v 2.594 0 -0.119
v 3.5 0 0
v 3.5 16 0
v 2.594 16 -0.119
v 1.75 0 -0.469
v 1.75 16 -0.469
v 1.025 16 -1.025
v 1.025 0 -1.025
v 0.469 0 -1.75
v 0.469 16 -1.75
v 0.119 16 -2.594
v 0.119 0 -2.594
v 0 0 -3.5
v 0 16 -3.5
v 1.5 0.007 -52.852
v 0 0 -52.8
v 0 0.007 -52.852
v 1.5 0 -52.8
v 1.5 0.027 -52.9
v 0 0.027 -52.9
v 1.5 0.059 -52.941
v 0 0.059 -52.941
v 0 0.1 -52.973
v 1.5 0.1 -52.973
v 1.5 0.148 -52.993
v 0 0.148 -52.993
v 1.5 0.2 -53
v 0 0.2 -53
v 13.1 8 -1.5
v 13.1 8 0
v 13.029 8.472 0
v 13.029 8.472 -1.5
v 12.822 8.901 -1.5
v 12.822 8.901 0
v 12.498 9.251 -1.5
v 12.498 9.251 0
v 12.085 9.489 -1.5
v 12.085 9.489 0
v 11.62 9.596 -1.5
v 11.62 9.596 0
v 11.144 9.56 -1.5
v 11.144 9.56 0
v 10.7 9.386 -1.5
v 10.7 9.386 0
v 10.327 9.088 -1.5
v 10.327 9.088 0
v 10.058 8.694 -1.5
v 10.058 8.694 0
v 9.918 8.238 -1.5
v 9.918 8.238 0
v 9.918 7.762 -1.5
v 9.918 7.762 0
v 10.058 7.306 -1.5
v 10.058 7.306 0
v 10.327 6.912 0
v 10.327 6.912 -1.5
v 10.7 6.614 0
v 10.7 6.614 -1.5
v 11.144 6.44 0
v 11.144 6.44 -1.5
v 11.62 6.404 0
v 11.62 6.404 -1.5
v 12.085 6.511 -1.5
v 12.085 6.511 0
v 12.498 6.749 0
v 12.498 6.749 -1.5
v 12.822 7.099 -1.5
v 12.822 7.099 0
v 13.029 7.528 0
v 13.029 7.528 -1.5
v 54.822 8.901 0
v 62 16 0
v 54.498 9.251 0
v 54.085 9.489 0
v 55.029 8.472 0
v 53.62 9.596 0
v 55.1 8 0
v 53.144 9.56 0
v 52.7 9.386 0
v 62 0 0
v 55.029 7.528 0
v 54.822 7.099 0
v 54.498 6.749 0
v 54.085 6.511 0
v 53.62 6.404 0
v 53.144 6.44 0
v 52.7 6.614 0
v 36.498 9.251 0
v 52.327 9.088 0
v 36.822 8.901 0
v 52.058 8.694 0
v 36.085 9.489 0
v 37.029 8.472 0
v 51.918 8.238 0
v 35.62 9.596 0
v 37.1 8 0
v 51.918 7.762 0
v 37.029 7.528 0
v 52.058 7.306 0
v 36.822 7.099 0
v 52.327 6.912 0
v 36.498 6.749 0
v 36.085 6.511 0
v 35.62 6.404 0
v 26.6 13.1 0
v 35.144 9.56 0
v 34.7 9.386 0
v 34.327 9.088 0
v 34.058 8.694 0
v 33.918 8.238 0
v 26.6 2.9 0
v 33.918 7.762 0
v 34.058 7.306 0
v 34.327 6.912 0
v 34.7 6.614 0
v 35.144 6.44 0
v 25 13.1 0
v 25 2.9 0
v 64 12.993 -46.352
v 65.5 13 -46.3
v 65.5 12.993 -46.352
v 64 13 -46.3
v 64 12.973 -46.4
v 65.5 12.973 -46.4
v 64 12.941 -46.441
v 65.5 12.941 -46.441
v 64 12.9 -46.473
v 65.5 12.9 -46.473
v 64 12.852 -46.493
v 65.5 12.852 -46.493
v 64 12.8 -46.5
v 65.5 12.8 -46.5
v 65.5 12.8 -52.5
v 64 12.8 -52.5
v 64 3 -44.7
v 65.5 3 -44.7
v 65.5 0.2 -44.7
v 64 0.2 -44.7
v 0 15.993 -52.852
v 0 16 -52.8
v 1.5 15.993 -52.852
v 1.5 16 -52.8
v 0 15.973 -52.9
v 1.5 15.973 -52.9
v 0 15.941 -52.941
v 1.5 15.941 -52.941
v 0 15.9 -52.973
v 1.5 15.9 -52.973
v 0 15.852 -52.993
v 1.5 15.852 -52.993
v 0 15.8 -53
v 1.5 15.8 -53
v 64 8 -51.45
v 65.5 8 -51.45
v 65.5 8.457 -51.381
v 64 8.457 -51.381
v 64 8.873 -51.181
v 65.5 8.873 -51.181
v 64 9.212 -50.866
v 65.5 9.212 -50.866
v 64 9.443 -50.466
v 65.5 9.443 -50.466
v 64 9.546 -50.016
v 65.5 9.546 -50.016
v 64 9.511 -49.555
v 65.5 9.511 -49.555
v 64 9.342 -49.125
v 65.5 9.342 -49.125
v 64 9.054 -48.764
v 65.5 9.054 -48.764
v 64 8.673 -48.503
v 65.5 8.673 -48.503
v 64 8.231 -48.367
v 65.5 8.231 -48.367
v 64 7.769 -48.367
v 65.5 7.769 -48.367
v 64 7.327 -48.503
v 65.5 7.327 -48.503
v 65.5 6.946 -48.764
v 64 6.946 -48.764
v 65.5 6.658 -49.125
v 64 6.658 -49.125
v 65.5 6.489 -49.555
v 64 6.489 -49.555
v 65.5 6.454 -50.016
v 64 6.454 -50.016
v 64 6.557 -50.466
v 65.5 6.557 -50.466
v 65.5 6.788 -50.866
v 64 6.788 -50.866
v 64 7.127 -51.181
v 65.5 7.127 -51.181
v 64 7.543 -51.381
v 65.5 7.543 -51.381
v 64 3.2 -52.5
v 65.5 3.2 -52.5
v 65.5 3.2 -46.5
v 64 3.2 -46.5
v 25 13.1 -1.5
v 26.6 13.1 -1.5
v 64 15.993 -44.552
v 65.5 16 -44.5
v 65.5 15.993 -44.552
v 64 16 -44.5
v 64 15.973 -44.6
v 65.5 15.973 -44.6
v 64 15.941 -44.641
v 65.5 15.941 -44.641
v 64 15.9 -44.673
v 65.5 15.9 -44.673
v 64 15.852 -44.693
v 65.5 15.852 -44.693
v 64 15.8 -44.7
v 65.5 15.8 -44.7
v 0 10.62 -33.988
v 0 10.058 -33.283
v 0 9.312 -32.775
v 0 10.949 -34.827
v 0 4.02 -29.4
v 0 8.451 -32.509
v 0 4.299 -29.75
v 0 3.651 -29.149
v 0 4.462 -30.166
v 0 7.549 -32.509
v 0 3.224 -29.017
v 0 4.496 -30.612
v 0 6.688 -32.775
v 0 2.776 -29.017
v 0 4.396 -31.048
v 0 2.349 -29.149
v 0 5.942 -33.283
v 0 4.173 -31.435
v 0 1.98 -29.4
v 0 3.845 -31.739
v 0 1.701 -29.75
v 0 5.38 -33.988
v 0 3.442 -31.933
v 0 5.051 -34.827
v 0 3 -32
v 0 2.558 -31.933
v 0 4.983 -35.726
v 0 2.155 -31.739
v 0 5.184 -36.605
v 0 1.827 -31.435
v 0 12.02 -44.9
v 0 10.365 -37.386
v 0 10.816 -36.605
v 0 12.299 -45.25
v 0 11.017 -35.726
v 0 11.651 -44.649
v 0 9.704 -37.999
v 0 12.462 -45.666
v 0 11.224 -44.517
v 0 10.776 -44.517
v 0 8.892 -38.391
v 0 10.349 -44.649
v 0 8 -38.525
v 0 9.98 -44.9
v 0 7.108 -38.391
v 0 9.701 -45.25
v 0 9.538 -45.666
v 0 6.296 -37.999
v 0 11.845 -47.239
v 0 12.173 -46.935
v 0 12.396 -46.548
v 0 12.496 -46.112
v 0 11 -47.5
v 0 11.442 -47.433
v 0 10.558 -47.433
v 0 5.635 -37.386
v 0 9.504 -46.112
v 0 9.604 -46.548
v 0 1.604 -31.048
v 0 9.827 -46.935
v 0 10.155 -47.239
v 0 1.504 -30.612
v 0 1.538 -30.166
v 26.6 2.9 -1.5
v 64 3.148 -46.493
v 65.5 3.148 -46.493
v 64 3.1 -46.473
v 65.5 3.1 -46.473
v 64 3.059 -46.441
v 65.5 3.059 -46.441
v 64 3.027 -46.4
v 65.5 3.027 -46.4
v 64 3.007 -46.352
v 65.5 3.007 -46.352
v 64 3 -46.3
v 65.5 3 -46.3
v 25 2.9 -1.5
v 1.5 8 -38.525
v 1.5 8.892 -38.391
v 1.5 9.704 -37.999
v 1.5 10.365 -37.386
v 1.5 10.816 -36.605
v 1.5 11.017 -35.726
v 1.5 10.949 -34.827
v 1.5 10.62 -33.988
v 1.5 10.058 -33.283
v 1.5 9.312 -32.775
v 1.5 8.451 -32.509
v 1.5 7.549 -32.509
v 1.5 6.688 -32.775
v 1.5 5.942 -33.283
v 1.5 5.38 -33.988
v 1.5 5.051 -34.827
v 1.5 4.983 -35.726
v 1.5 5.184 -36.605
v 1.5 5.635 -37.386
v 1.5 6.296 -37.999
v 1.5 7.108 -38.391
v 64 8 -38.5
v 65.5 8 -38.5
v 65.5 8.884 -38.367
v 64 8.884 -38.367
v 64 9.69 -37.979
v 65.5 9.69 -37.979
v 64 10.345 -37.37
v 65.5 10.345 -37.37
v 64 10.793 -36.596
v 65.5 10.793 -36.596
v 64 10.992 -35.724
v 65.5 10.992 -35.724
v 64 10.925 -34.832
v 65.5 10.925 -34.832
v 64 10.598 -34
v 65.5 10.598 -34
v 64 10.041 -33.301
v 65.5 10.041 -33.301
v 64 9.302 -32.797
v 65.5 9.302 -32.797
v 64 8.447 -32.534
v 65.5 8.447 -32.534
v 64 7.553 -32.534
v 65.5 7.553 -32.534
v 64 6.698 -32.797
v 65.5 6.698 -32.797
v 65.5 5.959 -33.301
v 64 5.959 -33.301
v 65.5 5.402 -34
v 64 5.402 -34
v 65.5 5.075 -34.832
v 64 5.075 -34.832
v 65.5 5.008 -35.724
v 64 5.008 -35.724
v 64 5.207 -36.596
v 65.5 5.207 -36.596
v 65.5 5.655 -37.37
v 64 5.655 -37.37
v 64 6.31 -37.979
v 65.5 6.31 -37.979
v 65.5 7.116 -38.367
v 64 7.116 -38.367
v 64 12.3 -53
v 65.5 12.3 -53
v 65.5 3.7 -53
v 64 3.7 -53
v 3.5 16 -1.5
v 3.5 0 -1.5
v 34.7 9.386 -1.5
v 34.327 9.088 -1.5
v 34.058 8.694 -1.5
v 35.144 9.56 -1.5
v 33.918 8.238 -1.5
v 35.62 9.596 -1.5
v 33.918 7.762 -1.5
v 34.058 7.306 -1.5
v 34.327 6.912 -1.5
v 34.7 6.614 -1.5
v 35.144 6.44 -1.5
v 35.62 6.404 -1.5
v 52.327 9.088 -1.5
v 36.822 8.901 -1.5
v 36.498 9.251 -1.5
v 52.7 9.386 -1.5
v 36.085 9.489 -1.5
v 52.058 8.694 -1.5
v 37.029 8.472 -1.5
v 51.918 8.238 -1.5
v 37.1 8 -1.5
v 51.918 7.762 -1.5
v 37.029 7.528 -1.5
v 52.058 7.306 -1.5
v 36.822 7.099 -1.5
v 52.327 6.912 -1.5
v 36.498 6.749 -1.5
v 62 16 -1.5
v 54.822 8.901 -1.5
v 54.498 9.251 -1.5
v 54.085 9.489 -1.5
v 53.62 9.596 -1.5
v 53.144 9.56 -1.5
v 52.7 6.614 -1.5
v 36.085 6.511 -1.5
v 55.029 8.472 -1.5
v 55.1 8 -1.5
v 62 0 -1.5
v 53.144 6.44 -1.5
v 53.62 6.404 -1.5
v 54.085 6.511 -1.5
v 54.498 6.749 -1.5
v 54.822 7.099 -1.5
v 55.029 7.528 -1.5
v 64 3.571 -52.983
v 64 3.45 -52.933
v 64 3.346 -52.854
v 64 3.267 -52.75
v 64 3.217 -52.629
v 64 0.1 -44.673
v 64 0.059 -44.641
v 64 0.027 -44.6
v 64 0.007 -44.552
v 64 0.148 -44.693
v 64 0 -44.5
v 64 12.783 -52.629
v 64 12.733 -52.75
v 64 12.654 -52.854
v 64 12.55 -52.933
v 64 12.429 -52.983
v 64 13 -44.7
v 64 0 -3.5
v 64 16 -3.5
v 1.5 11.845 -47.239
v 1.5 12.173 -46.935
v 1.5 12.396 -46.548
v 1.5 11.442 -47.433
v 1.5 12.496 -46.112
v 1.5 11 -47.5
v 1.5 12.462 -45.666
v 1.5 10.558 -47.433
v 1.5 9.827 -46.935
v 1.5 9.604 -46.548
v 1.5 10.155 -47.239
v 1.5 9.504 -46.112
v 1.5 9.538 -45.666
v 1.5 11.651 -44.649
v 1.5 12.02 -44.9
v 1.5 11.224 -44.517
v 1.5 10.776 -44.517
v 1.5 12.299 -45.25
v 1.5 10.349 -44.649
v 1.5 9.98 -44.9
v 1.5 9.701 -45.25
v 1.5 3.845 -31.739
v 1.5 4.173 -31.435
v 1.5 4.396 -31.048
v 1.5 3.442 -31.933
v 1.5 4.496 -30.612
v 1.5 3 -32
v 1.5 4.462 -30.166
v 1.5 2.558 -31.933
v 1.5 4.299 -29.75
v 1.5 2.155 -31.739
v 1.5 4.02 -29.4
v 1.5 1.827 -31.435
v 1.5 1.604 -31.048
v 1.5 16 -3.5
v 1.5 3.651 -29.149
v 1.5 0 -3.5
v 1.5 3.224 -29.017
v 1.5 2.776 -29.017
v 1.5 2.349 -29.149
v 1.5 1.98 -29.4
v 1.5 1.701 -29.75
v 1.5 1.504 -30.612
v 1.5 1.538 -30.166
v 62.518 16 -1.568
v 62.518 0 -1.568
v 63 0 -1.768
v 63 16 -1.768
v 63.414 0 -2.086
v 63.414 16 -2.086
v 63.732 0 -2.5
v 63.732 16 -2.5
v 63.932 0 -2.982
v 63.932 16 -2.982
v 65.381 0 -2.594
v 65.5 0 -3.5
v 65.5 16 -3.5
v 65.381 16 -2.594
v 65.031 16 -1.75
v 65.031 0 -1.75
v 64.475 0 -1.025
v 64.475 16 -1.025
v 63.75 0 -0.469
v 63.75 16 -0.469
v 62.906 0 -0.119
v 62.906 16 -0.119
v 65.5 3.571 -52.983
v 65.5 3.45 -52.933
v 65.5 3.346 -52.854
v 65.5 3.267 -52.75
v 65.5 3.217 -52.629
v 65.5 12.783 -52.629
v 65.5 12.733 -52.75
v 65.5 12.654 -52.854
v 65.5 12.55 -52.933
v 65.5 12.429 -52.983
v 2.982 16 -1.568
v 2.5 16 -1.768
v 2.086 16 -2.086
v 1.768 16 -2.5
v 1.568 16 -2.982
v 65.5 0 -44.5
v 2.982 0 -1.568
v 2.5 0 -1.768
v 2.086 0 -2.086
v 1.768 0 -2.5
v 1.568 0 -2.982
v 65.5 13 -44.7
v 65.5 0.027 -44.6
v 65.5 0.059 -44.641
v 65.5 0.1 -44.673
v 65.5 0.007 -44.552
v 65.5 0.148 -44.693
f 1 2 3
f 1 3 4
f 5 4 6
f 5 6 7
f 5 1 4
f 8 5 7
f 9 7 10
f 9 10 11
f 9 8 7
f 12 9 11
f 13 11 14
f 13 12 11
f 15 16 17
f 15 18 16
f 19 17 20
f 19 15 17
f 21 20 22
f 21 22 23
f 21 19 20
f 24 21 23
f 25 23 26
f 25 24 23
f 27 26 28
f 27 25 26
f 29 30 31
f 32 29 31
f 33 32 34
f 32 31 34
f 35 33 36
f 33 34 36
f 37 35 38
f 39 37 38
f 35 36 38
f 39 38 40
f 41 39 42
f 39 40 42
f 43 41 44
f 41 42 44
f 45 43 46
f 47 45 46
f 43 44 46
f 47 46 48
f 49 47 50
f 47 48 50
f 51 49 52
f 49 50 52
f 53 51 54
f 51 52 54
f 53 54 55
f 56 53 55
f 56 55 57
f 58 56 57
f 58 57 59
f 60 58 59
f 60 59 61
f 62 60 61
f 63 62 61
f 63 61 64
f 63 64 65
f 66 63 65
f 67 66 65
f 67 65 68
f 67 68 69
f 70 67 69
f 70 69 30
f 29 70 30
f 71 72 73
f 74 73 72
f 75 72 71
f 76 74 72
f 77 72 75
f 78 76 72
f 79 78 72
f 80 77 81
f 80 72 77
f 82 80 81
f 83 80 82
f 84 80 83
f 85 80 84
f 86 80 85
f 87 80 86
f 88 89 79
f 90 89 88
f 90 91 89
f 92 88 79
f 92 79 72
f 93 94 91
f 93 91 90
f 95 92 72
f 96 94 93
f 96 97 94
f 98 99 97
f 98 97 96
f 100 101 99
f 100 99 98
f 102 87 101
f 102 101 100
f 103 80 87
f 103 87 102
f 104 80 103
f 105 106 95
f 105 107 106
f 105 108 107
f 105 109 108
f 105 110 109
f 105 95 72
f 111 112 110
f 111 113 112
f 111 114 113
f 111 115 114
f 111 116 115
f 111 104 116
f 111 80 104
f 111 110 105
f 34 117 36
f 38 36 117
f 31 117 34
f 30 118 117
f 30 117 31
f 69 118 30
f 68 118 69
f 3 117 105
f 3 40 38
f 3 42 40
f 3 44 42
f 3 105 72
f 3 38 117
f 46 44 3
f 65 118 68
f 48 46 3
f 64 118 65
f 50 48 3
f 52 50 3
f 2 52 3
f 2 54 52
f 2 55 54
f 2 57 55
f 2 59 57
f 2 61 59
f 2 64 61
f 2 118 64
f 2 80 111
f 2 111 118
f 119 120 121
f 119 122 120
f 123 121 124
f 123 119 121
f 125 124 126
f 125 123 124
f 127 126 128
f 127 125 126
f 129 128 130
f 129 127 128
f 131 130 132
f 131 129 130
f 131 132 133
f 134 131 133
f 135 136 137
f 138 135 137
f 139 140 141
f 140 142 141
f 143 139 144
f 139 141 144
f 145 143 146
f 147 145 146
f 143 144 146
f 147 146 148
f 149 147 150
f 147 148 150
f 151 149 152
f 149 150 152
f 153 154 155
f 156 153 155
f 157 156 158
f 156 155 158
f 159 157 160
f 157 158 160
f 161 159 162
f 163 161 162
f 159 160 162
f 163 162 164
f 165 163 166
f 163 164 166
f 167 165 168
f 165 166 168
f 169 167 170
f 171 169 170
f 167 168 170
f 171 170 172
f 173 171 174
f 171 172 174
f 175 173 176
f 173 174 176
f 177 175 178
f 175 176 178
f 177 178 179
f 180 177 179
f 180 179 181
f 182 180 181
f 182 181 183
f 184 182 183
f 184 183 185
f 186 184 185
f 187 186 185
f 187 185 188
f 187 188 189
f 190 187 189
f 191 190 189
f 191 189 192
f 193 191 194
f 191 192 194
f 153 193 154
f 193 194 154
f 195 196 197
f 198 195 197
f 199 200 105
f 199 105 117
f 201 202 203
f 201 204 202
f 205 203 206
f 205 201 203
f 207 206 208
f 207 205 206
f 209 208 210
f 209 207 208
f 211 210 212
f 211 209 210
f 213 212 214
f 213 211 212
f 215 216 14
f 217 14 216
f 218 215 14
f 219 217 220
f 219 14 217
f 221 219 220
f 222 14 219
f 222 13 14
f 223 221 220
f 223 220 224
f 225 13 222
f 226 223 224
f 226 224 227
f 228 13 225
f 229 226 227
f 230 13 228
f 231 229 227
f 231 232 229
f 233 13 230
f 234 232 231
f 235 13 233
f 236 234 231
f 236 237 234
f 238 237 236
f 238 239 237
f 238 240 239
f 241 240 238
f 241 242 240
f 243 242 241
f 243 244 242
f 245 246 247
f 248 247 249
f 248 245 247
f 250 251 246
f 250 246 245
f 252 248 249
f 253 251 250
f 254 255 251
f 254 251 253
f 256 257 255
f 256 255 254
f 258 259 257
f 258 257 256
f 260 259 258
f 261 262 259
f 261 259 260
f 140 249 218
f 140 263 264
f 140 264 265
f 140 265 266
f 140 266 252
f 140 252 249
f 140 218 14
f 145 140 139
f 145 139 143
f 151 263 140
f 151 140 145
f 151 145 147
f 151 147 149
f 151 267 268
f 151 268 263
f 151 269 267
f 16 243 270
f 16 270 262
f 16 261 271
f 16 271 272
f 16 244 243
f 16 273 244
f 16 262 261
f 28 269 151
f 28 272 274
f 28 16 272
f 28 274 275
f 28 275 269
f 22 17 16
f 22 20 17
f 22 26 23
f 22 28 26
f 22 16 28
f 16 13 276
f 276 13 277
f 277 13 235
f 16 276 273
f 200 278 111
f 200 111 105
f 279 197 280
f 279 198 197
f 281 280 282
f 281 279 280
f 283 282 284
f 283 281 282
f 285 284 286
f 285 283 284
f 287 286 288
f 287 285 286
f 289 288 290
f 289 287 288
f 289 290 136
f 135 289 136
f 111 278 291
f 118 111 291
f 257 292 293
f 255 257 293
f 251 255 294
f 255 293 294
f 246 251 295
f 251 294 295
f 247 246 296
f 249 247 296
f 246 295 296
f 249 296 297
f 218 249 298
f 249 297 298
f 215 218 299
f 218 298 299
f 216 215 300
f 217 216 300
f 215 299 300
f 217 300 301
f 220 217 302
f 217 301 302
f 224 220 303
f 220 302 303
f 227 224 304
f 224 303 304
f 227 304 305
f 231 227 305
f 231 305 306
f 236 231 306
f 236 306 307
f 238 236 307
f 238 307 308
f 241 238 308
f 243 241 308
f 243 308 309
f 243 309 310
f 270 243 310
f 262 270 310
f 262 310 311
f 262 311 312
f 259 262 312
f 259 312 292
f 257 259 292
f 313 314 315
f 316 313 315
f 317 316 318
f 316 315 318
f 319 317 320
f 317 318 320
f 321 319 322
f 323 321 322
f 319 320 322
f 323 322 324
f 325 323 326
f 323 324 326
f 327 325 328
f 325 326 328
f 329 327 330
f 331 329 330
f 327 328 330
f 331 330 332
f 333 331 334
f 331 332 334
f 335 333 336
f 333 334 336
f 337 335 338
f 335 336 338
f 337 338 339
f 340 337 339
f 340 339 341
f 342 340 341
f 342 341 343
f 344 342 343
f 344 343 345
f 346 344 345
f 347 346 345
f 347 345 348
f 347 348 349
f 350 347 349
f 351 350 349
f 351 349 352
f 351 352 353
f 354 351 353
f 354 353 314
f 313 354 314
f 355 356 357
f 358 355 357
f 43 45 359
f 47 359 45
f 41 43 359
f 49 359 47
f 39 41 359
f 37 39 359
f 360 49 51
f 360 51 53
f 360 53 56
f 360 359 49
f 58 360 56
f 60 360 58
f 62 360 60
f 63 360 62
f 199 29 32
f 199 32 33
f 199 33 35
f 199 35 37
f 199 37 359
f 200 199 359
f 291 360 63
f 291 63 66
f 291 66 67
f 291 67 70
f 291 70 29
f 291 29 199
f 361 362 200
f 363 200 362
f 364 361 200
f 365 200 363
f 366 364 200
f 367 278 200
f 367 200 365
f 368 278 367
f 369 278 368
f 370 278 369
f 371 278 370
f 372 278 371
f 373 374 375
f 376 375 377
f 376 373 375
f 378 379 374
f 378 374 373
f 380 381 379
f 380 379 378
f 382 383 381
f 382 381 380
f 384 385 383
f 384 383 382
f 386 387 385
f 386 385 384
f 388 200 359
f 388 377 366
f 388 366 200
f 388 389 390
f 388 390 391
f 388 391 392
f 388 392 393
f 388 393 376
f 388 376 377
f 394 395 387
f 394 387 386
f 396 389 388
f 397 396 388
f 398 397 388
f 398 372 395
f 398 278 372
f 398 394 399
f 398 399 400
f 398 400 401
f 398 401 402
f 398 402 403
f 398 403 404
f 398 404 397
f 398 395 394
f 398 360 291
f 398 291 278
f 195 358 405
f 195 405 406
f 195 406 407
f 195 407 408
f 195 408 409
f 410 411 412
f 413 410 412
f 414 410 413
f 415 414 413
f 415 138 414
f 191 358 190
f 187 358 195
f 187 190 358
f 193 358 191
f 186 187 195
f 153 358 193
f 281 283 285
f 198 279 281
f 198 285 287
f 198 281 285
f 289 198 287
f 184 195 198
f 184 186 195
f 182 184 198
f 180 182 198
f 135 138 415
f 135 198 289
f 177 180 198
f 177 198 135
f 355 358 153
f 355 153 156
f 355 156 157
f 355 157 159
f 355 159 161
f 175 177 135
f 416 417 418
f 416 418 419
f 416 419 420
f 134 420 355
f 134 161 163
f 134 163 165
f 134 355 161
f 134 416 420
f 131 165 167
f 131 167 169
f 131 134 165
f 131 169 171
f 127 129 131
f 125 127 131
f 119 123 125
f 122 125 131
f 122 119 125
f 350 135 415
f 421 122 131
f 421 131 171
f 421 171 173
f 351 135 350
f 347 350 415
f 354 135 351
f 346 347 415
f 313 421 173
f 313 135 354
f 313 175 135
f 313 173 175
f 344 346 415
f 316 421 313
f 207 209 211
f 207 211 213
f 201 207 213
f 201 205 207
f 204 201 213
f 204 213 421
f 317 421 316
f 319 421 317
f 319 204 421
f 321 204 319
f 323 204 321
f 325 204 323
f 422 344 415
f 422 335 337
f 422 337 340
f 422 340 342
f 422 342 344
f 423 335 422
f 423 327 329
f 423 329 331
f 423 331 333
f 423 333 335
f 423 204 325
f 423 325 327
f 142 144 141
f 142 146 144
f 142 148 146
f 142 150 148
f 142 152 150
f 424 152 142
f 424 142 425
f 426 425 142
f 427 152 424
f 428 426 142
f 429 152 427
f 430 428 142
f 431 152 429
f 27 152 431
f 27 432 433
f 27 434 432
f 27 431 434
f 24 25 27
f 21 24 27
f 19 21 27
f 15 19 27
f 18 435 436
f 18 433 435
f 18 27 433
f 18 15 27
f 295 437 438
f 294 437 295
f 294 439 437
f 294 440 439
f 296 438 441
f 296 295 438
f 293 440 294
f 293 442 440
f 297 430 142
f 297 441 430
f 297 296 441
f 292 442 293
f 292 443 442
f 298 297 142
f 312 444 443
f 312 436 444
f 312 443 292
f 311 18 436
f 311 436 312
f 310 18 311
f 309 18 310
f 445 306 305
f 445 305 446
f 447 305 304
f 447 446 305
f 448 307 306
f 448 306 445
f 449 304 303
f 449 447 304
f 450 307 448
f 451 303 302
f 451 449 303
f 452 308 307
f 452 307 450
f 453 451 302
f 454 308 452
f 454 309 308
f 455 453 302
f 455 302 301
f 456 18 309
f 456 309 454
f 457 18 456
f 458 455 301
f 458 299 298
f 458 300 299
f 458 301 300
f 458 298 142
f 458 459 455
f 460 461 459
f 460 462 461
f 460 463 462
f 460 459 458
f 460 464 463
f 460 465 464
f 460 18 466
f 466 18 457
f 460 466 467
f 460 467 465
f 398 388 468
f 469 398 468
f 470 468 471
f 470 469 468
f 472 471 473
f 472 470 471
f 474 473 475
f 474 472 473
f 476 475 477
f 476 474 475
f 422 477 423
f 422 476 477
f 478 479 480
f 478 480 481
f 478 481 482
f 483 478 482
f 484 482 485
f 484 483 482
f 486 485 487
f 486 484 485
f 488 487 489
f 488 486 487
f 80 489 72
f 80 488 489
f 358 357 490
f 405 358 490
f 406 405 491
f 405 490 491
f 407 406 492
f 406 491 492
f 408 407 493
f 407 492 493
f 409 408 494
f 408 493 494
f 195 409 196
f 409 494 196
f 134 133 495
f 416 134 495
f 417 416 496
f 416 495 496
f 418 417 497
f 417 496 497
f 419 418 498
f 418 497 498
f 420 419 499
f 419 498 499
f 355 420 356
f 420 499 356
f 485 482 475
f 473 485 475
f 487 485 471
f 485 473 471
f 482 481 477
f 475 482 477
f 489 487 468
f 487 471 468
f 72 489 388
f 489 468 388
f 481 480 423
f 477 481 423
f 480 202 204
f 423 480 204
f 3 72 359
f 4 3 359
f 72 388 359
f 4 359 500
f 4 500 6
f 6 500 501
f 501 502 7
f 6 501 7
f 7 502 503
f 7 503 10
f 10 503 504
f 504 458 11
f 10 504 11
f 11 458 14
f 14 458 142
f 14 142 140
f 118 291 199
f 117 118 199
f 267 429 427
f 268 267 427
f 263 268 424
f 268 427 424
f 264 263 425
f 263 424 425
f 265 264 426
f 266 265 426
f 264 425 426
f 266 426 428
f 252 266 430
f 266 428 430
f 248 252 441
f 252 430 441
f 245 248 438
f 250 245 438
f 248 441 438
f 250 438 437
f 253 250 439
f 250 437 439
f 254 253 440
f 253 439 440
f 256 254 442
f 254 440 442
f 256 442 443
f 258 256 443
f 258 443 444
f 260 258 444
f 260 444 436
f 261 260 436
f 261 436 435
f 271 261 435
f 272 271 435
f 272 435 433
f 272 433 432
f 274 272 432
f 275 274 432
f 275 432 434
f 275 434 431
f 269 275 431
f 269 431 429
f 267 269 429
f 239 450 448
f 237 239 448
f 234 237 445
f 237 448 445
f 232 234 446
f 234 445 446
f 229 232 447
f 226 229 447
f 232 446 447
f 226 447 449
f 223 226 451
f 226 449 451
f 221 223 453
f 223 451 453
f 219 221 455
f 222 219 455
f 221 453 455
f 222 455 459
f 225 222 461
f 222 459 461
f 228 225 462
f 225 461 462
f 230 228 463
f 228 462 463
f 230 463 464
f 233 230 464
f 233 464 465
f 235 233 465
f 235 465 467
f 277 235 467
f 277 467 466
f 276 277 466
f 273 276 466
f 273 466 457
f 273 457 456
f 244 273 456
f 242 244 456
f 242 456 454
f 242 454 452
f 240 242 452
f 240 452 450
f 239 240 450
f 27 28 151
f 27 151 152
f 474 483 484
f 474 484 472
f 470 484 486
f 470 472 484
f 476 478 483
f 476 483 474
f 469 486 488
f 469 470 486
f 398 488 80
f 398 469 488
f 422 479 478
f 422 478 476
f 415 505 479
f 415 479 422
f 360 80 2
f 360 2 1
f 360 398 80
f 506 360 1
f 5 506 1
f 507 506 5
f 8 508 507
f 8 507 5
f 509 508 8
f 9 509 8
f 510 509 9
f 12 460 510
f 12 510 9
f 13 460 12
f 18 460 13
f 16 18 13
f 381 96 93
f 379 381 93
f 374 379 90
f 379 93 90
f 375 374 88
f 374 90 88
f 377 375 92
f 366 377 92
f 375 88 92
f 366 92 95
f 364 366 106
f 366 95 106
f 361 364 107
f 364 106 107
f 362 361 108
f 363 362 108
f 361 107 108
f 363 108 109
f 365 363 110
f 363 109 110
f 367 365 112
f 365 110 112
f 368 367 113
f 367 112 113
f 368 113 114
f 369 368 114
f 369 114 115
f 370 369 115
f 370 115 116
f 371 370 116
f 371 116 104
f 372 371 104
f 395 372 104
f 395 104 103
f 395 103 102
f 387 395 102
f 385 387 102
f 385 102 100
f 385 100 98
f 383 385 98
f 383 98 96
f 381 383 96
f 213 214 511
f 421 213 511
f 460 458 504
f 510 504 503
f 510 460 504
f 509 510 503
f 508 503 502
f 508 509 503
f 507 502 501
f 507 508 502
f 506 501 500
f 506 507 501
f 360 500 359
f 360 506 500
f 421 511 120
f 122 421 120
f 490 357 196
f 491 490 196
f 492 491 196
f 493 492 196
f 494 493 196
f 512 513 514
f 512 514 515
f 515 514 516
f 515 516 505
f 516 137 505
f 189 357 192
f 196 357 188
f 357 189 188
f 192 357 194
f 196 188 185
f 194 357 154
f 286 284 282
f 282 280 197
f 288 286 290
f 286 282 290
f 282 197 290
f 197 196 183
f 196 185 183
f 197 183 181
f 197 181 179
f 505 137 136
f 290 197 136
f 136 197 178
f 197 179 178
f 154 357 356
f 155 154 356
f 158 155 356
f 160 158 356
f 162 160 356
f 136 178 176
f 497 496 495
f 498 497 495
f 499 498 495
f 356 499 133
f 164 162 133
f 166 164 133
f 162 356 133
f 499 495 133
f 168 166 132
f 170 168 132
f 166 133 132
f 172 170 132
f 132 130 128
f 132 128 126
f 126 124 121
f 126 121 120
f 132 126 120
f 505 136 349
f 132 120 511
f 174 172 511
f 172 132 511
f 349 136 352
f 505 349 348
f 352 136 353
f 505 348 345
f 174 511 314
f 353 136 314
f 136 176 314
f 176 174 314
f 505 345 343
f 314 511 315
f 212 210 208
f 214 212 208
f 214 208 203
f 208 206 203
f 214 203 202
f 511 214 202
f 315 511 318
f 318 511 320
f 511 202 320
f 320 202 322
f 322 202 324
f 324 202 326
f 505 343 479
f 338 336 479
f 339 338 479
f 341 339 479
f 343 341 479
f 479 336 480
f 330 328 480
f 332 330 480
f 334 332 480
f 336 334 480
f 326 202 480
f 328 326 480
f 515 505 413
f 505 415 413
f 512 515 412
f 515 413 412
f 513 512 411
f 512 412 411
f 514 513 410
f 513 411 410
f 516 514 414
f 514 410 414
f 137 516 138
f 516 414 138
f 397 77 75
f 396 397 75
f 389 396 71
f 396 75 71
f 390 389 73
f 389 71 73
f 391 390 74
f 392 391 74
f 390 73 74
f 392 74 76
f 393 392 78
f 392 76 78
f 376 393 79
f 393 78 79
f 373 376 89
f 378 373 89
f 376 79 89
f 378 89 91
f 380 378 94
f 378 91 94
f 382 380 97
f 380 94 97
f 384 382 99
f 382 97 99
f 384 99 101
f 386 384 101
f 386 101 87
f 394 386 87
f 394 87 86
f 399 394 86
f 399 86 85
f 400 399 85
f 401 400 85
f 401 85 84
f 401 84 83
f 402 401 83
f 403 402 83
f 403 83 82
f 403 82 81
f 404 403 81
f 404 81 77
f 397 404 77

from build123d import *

# Parameters (mm, degrees)
BASE_FLANGE1_DEPTH = 16
SKETCH6_W          = 1.6
SKETCH6_H          = 10.2
CUT_EXTRUDE1_DEPTH = 10
SKETCH7_R          = 3
CUT_EXTRUDE2_DEPTH = 10
CUT_EXTRUDE3_DEPTH = 10
FILLET1_R          = 0.2
SKETCH11_R         = 1.55
TAB1_DEPTH         = 1.5
SKETCH15_R         = 1.6
CUT_EXTRUDE6_DEPTH = 10
SKETCH9_R          = 3.025
SKETCH9_R_2        = 1.5
CUT_EXTRUDE4_DEPTH = 10


# Sheet-metal steps are written as plain solids
with BuildPart() as part:
    # Sketch1 → Base-Flange1 (new body)
    with BuildSketch(Plane(origin=(0, 0, 0), x_dir=(1, 0, 0), z_dir=(0, 1, 0))):
        with BuildLine():
            Line((65.5, 50), (65.5, 3.5))
            ThreePointArc((65.5, 3.5), (64.474873734, 1.025126266), (62, 0))
            Line((62, 0), (3.5, 0))
            ThreePointArc((3.5, 0), (1.025126266, 1.025126266), (0, 3.5))
            Line((0, 3.5), (0, 53))
            Line((0, 53), (1.5, 53))
            Line((1.5, 53), (1.5, 3.5))
            ThreePointArc((1.5, 3.5), (2.085786438, 2.085786438), (3.5, 1.5))
            Line((3.5, 1.5), (62, 1.5))
            ThreePointArc((62, 1.5), (63.414213562, 2.085786438), (64, 3.5))
            Line((64, 3.5), (64, 50))
            Line((64, 50), (65.5, 50))
        make_face()
    extrude(amount=BASE_FLANGE1_DEPTH)

    # Sketch6 → Cut-Extrude1 (cut)
    with BuildSketch(Plane(origin=(0, 0, -1.5), x_dir=(-1, 0, 0), z_dir=(0, 0, -1))):
        with Locations((-25.8, 8)):
            Rectangle(SKETCH6_W, SKETCH6_H)
    extrude(amount=-CUT_EXTRUDE1_DEPTH, mode=Mode.SUBTRACT)

    # Sketch7 → Cut-Extrude2 (cut)
    with BuildSketch(Plane(origin=(65.5, 0, 0), x_dir=(0, 0, -1), z_dir=(1, 0, 0))):
        with Locations((35.5, 8)):
            Circle(SKETCH7_R)
    extrude(amount=-CUT_EXTRUDE2_DEPTH, mode=Mode.SUBTRACT)

    # Sketch8 → Cut-Extrude3 (cut)
    with BuildSketch(Plane(origin=(65.5, 0, 0), x_dir=(0, 0, -1), z_dir=(1, 0, 0))):
        Polygon((50, 16), (44.7, 16), (44.7, 13), (46.5, 13), (46.5, 3), (44.7, 3), (44.7, 0), (50, 0), (53, 0), (53, 16), align=None)
    extrude(amount=-CUT_EXTRUDE3_DEPTH, mode=Mode.SUBTRACT)

    # Fillet1
    fillet1_edges = [part.edges().sort_by_distance(p)[0] for p in [
        (0.75, 0, -53),
        (0.75, 16, -53),
        (64.75, 16, -44.7),
        (64.75, 0, -44.7),
        (64.75, 3, -46.5),
        (64.75, 13, -46.5),
    ]]
    fillet(fillet1_edges, radius=FILLET1_R)

    # Sketch11 → Tab1 (add)
    with BuildSketch(Plane(origin=(65.5, 0, 0), x_dir=(0, 0, -1), z_dir=(1, 0, 0))):
        with BuildLine():
            Line((46.5, 12.8), (52.5, 12.8))
            ThreePointArc((52.5, 12.8), (52.853553391, 12.653553391), (53, 12.3))
            Line((53, 12.3), (53, 3.7))
            ThreePointArc((53, 3.7), (52.853553391, 3.346446609), (52.5, 3.2))
            Line((52.5, 3.2), (46.5, 3.2))
            Line((46.5, 3.2), (46.5, 12.8))
        make_face()
        with Locations((49.9, 8)):
            Circle(SKETCH11_R, mode=Mode.SUBTRACT)
    extrude(amount=-TAB1_DEPTH)

    # Sketch15 → Cut-Extrude6 (cut)
    with BuildSketch(Plane.XY):
        with Locations((35.5, 8)):
            Circle(SKETCH15_R)
        with Locations((53.5, 8)):
            Circle(SKETCH15_R)
        with Locations((11.5, 8)):
            Circle(SKETCH15_R)
    extrude(amount=-CUT_EXTRUDE6_DEPTH, mode=Mode.SUBTRACT)

    # Sketch9 → Cut-Extrude4 (cut)
    with BuildSketch(Plane(origin=(1.5, 0, 0), x_dir=(0, 0, -1), z_dir=(1, 0, 0))):
        with Locations((35.5, 8)):
            Circle(SKETCH9_R)
        with Locations((30.5, 3)):
            Circle(SKETCH9_R_2)
        with Locations((46, 11)):
            Circle(SKETCH9_R_2)
    extrude(amount=-CUT_EXTRUDE4_DEPTH, mode=Mode.SUBTRACT)


solid = part.part
